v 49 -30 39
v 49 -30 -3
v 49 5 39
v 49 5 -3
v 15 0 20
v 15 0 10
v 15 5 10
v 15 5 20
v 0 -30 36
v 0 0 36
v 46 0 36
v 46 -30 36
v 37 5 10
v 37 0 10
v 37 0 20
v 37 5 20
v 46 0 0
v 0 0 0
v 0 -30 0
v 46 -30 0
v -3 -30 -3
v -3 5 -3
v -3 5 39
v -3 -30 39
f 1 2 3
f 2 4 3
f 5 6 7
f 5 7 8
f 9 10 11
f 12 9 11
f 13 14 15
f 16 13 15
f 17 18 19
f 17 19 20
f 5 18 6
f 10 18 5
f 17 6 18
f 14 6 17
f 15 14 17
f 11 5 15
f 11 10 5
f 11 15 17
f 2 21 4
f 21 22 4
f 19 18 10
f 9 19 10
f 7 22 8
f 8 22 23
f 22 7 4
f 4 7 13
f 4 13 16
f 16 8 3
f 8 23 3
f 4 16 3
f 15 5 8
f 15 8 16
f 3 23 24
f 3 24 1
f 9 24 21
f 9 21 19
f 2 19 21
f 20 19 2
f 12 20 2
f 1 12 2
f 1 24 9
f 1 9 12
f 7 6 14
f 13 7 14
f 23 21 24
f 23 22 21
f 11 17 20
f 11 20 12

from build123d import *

# Parameters (mm, degrees)
F0_W     = 52
F0_H     = 42
F0_W_2   = 46
F0_H_2   = 36
F0_W_3   = 22
F0_H_3   = 10
F1_DEPTH = 5
F2_DEPTH = 30


with BuildPart() as f1:
    # F0 (on Front) → F1 (new body)
    with BuildSketch(Plane.XZ):
        with Locations((23, 18)):
            Rectangle(F0_W, F0_H)
        with Locations((23, 18)):
            Rectangle(F0_W_2, F0_H_2, mode=Mode.SUBTRACT)
        with Locations((23, 18)):
            Rectangle(F0_W_2, F0_H_2)
        with Locations((26, 15)):
            Rectangle(F0_W_3, F0_H_3, mode=Mode.SUBTRACT)
    extrude(amount=-F1_DEPTH)

    # F0 (on Front) → F2 (join)
    with BuildSketch(Plane.XZ):
        with Locations((23, 18)):
            Rectangle(F0_W, F0_H)
        with Locations((23, 18)):
            Rectangle(F0_W_2, F0_H_2, mode=Mode.SUBTRACT)
    extrude(amount=F2_DEPTH)


solid = f1.part
